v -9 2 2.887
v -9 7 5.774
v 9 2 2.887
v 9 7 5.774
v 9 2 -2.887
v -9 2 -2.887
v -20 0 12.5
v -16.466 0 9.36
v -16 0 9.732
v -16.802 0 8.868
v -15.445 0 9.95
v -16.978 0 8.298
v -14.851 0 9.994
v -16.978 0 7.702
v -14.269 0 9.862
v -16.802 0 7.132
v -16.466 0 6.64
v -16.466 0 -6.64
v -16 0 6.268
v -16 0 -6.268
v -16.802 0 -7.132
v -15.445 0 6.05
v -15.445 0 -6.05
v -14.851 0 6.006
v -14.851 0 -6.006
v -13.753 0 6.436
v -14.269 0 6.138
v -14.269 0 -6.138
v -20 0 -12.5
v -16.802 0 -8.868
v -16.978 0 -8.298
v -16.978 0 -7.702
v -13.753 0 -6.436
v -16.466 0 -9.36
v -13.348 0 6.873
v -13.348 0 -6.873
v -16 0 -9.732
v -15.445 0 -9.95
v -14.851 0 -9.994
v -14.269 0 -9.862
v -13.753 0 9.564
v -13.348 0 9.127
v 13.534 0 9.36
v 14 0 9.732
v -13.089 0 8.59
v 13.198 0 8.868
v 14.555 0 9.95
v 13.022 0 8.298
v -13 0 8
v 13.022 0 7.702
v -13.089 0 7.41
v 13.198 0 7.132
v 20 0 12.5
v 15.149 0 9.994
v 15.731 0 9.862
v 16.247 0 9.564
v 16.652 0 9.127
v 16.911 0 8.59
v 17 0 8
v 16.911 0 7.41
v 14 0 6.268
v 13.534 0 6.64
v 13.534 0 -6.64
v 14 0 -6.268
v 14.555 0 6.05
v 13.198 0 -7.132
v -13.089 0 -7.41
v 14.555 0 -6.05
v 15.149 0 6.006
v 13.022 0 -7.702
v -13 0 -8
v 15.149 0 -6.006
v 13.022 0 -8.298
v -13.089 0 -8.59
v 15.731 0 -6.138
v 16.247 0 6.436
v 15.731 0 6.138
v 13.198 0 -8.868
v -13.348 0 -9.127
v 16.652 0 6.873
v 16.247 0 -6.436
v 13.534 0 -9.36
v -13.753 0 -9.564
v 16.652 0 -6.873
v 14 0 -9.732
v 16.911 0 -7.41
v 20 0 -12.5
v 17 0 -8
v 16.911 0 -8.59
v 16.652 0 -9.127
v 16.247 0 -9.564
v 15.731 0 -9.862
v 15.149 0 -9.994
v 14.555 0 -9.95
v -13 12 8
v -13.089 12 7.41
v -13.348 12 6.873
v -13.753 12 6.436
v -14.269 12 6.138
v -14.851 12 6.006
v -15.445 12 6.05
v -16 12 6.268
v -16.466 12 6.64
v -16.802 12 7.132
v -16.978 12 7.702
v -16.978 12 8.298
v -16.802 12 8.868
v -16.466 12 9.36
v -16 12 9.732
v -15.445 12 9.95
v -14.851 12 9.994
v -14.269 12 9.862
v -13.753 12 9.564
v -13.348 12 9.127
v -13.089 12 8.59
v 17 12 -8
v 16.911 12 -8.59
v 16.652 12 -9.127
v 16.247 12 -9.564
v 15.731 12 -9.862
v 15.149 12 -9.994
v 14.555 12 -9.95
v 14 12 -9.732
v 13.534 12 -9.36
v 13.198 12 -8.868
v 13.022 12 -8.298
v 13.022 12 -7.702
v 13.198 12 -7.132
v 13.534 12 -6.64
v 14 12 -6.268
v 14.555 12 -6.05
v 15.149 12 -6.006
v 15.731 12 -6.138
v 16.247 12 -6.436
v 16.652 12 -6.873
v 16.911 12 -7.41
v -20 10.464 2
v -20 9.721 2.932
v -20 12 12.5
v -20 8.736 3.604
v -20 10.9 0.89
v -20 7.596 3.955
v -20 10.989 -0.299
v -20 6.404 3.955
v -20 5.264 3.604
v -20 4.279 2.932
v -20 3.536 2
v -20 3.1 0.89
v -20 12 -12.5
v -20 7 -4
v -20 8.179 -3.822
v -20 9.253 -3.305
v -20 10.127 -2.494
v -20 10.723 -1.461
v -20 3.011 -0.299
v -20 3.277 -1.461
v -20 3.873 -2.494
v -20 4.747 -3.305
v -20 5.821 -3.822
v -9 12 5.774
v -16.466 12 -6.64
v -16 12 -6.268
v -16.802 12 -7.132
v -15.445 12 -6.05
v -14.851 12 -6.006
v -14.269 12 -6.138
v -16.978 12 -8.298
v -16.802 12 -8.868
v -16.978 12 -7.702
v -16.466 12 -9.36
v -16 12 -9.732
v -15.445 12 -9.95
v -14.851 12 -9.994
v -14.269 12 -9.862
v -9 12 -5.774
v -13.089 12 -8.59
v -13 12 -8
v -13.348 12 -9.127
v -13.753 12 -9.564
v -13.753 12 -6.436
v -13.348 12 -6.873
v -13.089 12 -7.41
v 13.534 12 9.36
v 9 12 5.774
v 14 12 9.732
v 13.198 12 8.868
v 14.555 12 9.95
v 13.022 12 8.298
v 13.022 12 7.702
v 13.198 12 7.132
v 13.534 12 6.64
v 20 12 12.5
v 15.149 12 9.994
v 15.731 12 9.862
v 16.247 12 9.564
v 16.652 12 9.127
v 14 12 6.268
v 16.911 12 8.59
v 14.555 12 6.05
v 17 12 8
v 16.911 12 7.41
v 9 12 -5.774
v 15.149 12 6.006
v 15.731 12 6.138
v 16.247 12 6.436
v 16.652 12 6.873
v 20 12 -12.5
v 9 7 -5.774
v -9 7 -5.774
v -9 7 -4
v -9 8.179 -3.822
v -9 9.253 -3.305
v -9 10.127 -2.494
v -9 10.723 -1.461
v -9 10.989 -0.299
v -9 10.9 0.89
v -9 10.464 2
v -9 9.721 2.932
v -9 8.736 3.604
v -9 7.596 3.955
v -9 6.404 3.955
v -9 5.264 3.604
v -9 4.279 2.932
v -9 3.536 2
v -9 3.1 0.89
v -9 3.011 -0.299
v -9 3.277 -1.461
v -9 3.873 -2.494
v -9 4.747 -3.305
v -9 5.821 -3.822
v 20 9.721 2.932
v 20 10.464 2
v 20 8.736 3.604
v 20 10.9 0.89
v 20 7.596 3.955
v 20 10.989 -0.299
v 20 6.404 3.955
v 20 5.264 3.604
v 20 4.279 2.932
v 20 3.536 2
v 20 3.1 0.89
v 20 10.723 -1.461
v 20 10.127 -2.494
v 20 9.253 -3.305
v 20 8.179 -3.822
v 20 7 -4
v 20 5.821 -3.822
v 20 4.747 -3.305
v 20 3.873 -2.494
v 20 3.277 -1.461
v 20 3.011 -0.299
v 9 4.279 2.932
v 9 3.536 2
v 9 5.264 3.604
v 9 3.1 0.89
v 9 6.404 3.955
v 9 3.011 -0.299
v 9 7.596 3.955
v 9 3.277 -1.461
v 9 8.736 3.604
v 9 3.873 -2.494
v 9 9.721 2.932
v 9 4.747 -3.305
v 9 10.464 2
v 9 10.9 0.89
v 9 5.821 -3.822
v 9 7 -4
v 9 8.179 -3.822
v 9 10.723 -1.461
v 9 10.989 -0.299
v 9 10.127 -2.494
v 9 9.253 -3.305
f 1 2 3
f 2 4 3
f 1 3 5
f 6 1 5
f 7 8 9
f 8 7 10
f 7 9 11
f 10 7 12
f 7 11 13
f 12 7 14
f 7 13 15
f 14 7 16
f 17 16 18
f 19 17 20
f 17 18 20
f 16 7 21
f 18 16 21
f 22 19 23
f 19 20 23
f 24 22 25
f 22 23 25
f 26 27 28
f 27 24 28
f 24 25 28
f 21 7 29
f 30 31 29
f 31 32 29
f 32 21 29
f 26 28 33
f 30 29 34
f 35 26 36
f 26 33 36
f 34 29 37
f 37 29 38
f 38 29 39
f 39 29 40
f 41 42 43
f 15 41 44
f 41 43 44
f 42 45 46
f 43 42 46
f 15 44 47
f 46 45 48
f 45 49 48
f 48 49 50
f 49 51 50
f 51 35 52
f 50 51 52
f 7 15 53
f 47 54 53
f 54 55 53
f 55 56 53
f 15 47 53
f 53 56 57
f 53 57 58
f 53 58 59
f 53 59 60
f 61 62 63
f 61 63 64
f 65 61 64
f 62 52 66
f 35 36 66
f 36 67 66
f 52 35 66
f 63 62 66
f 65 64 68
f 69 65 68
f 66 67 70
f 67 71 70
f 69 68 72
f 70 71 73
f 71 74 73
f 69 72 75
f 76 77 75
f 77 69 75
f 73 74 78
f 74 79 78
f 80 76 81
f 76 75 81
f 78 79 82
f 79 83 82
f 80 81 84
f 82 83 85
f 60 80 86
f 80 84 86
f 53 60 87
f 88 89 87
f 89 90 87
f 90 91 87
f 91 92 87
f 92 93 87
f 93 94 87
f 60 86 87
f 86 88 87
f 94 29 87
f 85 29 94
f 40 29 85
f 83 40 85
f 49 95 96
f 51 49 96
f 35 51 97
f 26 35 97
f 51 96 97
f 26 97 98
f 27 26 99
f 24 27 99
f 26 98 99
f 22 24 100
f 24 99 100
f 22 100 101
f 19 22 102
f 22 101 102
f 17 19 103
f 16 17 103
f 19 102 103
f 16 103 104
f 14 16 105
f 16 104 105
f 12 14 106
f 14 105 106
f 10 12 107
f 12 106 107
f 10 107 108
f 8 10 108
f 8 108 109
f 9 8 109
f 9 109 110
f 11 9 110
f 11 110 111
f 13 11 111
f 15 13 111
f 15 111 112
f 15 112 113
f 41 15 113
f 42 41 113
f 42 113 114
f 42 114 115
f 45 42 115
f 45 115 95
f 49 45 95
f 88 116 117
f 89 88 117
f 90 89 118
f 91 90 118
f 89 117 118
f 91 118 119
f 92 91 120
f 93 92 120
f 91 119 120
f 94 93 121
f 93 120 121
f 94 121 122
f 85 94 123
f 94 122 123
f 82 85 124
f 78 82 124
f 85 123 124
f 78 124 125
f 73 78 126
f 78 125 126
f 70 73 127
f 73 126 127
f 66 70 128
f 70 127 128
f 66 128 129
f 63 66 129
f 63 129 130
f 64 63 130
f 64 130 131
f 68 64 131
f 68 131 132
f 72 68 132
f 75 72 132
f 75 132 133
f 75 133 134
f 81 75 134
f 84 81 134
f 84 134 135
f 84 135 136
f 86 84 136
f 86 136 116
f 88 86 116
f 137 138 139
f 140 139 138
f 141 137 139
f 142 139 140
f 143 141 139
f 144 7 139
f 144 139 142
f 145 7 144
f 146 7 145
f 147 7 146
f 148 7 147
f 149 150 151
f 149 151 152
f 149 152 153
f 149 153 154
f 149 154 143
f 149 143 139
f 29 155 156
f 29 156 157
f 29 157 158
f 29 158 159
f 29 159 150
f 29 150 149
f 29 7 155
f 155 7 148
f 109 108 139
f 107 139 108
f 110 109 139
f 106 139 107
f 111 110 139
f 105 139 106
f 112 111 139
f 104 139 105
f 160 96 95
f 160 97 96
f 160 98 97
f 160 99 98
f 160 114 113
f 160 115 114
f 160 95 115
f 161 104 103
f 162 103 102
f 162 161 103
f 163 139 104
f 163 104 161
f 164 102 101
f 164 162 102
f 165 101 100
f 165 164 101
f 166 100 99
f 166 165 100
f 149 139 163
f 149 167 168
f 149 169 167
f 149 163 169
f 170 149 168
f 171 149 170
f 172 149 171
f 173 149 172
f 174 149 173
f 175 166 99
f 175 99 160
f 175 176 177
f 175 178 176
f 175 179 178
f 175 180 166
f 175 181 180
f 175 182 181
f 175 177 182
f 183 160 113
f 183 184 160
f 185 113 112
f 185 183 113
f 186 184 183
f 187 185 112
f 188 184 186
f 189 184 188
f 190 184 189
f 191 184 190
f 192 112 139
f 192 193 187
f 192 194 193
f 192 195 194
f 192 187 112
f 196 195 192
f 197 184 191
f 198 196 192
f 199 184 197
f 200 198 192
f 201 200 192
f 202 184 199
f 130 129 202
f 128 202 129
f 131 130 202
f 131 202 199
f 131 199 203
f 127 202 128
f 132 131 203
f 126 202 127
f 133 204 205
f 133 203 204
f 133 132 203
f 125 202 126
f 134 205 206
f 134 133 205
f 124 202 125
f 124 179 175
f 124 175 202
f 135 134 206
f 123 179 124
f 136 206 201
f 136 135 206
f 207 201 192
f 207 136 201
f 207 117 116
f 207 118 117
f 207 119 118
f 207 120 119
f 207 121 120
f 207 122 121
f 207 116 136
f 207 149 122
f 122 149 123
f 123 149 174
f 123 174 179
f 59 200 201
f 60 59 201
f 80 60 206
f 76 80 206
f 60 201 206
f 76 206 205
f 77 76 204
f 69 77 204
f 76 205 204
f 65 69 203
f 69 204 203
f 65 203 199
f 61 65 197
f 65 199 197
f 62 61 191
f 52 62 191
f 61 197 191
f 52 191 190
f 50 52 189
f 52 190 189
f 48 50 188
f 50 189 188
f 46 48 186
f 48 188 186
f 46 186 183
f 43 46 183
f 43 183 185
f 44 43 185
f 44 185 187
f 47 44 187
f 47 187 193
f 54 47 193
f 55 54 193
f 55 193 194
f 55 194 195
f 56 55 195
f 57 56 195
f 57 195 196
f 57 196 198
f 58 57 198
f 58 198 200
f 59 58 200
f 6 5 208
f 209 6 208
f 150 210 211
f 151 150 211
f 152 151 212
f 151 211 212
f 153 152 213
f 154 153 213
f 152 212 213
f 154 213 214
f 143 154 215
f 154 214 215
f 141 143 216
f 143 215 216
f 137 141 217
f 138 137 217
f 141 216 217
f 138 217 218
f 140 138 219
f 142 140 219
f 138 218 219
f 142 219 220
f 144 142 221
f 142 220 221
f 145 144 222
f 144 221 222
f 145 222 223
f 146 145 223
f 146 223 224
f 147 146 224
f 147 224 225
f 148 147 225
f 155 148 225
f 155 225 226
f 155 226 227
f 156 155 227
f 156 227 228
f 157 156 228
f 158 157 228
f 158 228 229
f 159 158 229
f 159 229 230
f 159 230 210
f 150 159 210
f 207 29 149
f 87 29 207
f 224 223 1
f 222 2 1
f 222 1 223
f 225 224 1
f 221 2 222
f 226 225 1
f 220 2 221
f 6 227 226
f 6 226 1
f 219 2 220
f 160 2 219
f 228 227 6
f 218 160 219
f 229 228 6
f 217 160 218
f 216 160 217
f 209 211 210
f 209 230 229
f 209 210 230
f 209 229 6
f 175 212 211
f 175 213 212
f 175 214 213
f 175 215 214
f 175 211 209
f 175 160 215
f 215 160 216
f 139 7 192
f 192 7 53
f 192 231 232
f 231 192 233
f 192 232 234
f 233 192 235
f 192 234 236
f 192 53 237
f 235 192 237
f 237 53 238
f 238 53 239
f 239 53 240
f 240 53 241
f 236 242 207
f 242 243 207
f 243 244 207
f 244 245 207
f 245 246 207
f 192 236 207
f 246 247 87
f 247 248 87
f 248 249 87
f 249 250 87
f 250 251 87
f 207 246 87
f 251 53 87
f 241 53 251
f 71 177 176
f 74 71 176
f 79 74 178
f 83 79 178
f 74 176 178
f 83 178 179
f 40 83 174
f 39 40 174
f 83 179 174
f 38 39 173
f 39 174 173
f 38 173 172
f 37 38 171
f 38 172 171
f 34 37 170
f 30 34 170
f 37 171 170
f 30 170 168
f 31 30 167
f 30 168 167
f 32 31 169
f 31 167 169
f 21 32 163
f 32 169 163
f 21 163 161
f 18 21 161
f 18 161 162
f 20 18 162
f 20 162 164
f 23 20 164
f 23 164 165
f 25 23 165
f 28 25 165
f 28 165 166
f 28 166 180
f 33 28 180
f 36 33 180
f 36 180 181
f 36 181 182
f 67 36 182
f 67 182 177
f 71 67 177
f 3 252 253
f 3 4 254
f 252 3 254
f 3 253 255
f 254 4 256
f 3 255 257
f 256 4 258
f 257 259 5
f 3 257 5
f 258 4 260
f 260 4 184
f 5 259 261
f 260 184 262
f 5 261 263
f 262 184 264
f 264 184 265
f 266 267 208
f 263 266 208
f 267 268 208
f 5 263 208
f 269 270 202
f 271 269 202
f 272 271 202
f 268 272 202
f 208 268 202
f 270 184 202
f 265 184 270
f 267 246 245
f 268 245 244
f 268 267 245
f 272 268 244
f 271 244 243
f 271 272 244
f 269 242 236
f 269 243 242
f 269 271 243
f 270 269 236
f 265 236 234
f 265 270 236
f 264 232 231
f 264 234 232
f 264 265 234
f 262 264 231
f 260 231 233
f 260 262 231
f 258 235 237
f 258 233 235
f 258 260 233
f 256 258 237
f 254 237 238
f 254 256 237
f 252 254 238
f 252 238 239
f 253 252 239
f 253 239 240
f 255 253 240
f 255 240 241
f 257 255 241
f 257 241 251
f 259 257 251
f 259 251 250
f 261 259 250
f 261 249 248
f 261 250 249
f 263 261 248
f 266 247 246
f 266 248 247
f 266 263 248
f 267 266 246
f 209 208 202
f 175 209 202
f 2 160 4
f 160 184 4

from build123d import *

# Parameters (mm, degrees)
SKETCH1_W               = 40
SKETCH1_H               = 25
BOSS_EXTRUDE1_DEPTH     = 12
CUT_EXTRUDE1_DEPTH      = 9
CUT_EXTRUDE1_DEPTH_BACK = 9
SKETCH3_R               = 4
CUT_EXTRUDE2_DEPTH      = 21
CUT_EXTRUDE2_DEPTH_BACK = 21
SKETCH4_R               = 2
CUT_EXTRUDE3_DEPTH      = 1
CUT_EXTRUDE3_DEPTH_BACK = 13


with BuildPart() as part:
    # Sketch1 → Boss-Extrude1 (new body)
    with BuildSketch(Plane(origin=(0, 0, 0), x_dir=(1, 0, 0), z_dir=(0, 1, 0))):
        Rectangle(SKETCH1_W, SKETCH1_H)
    extrude(amount=BOSS_EXTRUDE1_DEPTH)

    # Sketch2 → Cut-Extrude1 (cut, two sides)
    with BuildSketch(Plane(origin=(0, 0, 0), x_dir=(0, 0, -1), z_dir=(1, 0, 0))) as cut_extrude1_sk:
        Polygon((-2.886751346, 2), (2.886751346, 2), (5.773502692, 7), (5.773502692, 12), (-5.773502692, 12), (-5.773502692, 7), align=None)
    extrude(amount=CUT_EXTRUDE1_DEPTH, mode=Mode.SUBTRACT)
    extrude(cut_extrude1_sk.sketch, amount=-CUT_EXTRUDE1_DEPTH_BACK, mode=Mode.SUBTRACT)

    # Sketch3 → Cut-Extrude2 (cut, two sides)
    with BuildSketch(Plane(origin=(0, 0, 0), x_dir=(0, 0, -1), z_dir=(1, 0, 0))) as cut_extrude2_sk:
        with Locations((0, 7)):
            Circle(SKETCH3_R)
    extrude(amount=CUT_EXTRUDE2_DEPTH, mode=Mode.SUBTRACT)
    extrude(cut_extrude2_sk.sketch, amount=-CUT_EXTRUDE2_DEPTH_BACK, mode=Mode.SUBTRACT)

    # Sketch4 → Cut-Extrude3 (cut, two sides)
    with BuildSketch(Plane(origin=(0, 12, 0), x_dir=(1, 0, 0), z_dir=(0, 1, 0))) as cut_extrude3_sk:
        with Locations((-15, 8)):
            Circle(SKETCH4_R)
        with Locations((15, 8)):
            Circle(SKETCH4_R)
        with Locations((15, -8)):
            Circle(SKETCH4_R)
        with Locations((-15, -8)):
            Circle(SKETCH4_R)
    extrude(amount=CUT_EXTRUDE3_DEPTH, mode=Mode.SUBTRACT)
    extrude(cut_extrude3_sk.sketch, amount=-CUT_EXTRUDE3_DEPTH_BACK, mode=Mode.SUBTRACT)


solid = part.part
